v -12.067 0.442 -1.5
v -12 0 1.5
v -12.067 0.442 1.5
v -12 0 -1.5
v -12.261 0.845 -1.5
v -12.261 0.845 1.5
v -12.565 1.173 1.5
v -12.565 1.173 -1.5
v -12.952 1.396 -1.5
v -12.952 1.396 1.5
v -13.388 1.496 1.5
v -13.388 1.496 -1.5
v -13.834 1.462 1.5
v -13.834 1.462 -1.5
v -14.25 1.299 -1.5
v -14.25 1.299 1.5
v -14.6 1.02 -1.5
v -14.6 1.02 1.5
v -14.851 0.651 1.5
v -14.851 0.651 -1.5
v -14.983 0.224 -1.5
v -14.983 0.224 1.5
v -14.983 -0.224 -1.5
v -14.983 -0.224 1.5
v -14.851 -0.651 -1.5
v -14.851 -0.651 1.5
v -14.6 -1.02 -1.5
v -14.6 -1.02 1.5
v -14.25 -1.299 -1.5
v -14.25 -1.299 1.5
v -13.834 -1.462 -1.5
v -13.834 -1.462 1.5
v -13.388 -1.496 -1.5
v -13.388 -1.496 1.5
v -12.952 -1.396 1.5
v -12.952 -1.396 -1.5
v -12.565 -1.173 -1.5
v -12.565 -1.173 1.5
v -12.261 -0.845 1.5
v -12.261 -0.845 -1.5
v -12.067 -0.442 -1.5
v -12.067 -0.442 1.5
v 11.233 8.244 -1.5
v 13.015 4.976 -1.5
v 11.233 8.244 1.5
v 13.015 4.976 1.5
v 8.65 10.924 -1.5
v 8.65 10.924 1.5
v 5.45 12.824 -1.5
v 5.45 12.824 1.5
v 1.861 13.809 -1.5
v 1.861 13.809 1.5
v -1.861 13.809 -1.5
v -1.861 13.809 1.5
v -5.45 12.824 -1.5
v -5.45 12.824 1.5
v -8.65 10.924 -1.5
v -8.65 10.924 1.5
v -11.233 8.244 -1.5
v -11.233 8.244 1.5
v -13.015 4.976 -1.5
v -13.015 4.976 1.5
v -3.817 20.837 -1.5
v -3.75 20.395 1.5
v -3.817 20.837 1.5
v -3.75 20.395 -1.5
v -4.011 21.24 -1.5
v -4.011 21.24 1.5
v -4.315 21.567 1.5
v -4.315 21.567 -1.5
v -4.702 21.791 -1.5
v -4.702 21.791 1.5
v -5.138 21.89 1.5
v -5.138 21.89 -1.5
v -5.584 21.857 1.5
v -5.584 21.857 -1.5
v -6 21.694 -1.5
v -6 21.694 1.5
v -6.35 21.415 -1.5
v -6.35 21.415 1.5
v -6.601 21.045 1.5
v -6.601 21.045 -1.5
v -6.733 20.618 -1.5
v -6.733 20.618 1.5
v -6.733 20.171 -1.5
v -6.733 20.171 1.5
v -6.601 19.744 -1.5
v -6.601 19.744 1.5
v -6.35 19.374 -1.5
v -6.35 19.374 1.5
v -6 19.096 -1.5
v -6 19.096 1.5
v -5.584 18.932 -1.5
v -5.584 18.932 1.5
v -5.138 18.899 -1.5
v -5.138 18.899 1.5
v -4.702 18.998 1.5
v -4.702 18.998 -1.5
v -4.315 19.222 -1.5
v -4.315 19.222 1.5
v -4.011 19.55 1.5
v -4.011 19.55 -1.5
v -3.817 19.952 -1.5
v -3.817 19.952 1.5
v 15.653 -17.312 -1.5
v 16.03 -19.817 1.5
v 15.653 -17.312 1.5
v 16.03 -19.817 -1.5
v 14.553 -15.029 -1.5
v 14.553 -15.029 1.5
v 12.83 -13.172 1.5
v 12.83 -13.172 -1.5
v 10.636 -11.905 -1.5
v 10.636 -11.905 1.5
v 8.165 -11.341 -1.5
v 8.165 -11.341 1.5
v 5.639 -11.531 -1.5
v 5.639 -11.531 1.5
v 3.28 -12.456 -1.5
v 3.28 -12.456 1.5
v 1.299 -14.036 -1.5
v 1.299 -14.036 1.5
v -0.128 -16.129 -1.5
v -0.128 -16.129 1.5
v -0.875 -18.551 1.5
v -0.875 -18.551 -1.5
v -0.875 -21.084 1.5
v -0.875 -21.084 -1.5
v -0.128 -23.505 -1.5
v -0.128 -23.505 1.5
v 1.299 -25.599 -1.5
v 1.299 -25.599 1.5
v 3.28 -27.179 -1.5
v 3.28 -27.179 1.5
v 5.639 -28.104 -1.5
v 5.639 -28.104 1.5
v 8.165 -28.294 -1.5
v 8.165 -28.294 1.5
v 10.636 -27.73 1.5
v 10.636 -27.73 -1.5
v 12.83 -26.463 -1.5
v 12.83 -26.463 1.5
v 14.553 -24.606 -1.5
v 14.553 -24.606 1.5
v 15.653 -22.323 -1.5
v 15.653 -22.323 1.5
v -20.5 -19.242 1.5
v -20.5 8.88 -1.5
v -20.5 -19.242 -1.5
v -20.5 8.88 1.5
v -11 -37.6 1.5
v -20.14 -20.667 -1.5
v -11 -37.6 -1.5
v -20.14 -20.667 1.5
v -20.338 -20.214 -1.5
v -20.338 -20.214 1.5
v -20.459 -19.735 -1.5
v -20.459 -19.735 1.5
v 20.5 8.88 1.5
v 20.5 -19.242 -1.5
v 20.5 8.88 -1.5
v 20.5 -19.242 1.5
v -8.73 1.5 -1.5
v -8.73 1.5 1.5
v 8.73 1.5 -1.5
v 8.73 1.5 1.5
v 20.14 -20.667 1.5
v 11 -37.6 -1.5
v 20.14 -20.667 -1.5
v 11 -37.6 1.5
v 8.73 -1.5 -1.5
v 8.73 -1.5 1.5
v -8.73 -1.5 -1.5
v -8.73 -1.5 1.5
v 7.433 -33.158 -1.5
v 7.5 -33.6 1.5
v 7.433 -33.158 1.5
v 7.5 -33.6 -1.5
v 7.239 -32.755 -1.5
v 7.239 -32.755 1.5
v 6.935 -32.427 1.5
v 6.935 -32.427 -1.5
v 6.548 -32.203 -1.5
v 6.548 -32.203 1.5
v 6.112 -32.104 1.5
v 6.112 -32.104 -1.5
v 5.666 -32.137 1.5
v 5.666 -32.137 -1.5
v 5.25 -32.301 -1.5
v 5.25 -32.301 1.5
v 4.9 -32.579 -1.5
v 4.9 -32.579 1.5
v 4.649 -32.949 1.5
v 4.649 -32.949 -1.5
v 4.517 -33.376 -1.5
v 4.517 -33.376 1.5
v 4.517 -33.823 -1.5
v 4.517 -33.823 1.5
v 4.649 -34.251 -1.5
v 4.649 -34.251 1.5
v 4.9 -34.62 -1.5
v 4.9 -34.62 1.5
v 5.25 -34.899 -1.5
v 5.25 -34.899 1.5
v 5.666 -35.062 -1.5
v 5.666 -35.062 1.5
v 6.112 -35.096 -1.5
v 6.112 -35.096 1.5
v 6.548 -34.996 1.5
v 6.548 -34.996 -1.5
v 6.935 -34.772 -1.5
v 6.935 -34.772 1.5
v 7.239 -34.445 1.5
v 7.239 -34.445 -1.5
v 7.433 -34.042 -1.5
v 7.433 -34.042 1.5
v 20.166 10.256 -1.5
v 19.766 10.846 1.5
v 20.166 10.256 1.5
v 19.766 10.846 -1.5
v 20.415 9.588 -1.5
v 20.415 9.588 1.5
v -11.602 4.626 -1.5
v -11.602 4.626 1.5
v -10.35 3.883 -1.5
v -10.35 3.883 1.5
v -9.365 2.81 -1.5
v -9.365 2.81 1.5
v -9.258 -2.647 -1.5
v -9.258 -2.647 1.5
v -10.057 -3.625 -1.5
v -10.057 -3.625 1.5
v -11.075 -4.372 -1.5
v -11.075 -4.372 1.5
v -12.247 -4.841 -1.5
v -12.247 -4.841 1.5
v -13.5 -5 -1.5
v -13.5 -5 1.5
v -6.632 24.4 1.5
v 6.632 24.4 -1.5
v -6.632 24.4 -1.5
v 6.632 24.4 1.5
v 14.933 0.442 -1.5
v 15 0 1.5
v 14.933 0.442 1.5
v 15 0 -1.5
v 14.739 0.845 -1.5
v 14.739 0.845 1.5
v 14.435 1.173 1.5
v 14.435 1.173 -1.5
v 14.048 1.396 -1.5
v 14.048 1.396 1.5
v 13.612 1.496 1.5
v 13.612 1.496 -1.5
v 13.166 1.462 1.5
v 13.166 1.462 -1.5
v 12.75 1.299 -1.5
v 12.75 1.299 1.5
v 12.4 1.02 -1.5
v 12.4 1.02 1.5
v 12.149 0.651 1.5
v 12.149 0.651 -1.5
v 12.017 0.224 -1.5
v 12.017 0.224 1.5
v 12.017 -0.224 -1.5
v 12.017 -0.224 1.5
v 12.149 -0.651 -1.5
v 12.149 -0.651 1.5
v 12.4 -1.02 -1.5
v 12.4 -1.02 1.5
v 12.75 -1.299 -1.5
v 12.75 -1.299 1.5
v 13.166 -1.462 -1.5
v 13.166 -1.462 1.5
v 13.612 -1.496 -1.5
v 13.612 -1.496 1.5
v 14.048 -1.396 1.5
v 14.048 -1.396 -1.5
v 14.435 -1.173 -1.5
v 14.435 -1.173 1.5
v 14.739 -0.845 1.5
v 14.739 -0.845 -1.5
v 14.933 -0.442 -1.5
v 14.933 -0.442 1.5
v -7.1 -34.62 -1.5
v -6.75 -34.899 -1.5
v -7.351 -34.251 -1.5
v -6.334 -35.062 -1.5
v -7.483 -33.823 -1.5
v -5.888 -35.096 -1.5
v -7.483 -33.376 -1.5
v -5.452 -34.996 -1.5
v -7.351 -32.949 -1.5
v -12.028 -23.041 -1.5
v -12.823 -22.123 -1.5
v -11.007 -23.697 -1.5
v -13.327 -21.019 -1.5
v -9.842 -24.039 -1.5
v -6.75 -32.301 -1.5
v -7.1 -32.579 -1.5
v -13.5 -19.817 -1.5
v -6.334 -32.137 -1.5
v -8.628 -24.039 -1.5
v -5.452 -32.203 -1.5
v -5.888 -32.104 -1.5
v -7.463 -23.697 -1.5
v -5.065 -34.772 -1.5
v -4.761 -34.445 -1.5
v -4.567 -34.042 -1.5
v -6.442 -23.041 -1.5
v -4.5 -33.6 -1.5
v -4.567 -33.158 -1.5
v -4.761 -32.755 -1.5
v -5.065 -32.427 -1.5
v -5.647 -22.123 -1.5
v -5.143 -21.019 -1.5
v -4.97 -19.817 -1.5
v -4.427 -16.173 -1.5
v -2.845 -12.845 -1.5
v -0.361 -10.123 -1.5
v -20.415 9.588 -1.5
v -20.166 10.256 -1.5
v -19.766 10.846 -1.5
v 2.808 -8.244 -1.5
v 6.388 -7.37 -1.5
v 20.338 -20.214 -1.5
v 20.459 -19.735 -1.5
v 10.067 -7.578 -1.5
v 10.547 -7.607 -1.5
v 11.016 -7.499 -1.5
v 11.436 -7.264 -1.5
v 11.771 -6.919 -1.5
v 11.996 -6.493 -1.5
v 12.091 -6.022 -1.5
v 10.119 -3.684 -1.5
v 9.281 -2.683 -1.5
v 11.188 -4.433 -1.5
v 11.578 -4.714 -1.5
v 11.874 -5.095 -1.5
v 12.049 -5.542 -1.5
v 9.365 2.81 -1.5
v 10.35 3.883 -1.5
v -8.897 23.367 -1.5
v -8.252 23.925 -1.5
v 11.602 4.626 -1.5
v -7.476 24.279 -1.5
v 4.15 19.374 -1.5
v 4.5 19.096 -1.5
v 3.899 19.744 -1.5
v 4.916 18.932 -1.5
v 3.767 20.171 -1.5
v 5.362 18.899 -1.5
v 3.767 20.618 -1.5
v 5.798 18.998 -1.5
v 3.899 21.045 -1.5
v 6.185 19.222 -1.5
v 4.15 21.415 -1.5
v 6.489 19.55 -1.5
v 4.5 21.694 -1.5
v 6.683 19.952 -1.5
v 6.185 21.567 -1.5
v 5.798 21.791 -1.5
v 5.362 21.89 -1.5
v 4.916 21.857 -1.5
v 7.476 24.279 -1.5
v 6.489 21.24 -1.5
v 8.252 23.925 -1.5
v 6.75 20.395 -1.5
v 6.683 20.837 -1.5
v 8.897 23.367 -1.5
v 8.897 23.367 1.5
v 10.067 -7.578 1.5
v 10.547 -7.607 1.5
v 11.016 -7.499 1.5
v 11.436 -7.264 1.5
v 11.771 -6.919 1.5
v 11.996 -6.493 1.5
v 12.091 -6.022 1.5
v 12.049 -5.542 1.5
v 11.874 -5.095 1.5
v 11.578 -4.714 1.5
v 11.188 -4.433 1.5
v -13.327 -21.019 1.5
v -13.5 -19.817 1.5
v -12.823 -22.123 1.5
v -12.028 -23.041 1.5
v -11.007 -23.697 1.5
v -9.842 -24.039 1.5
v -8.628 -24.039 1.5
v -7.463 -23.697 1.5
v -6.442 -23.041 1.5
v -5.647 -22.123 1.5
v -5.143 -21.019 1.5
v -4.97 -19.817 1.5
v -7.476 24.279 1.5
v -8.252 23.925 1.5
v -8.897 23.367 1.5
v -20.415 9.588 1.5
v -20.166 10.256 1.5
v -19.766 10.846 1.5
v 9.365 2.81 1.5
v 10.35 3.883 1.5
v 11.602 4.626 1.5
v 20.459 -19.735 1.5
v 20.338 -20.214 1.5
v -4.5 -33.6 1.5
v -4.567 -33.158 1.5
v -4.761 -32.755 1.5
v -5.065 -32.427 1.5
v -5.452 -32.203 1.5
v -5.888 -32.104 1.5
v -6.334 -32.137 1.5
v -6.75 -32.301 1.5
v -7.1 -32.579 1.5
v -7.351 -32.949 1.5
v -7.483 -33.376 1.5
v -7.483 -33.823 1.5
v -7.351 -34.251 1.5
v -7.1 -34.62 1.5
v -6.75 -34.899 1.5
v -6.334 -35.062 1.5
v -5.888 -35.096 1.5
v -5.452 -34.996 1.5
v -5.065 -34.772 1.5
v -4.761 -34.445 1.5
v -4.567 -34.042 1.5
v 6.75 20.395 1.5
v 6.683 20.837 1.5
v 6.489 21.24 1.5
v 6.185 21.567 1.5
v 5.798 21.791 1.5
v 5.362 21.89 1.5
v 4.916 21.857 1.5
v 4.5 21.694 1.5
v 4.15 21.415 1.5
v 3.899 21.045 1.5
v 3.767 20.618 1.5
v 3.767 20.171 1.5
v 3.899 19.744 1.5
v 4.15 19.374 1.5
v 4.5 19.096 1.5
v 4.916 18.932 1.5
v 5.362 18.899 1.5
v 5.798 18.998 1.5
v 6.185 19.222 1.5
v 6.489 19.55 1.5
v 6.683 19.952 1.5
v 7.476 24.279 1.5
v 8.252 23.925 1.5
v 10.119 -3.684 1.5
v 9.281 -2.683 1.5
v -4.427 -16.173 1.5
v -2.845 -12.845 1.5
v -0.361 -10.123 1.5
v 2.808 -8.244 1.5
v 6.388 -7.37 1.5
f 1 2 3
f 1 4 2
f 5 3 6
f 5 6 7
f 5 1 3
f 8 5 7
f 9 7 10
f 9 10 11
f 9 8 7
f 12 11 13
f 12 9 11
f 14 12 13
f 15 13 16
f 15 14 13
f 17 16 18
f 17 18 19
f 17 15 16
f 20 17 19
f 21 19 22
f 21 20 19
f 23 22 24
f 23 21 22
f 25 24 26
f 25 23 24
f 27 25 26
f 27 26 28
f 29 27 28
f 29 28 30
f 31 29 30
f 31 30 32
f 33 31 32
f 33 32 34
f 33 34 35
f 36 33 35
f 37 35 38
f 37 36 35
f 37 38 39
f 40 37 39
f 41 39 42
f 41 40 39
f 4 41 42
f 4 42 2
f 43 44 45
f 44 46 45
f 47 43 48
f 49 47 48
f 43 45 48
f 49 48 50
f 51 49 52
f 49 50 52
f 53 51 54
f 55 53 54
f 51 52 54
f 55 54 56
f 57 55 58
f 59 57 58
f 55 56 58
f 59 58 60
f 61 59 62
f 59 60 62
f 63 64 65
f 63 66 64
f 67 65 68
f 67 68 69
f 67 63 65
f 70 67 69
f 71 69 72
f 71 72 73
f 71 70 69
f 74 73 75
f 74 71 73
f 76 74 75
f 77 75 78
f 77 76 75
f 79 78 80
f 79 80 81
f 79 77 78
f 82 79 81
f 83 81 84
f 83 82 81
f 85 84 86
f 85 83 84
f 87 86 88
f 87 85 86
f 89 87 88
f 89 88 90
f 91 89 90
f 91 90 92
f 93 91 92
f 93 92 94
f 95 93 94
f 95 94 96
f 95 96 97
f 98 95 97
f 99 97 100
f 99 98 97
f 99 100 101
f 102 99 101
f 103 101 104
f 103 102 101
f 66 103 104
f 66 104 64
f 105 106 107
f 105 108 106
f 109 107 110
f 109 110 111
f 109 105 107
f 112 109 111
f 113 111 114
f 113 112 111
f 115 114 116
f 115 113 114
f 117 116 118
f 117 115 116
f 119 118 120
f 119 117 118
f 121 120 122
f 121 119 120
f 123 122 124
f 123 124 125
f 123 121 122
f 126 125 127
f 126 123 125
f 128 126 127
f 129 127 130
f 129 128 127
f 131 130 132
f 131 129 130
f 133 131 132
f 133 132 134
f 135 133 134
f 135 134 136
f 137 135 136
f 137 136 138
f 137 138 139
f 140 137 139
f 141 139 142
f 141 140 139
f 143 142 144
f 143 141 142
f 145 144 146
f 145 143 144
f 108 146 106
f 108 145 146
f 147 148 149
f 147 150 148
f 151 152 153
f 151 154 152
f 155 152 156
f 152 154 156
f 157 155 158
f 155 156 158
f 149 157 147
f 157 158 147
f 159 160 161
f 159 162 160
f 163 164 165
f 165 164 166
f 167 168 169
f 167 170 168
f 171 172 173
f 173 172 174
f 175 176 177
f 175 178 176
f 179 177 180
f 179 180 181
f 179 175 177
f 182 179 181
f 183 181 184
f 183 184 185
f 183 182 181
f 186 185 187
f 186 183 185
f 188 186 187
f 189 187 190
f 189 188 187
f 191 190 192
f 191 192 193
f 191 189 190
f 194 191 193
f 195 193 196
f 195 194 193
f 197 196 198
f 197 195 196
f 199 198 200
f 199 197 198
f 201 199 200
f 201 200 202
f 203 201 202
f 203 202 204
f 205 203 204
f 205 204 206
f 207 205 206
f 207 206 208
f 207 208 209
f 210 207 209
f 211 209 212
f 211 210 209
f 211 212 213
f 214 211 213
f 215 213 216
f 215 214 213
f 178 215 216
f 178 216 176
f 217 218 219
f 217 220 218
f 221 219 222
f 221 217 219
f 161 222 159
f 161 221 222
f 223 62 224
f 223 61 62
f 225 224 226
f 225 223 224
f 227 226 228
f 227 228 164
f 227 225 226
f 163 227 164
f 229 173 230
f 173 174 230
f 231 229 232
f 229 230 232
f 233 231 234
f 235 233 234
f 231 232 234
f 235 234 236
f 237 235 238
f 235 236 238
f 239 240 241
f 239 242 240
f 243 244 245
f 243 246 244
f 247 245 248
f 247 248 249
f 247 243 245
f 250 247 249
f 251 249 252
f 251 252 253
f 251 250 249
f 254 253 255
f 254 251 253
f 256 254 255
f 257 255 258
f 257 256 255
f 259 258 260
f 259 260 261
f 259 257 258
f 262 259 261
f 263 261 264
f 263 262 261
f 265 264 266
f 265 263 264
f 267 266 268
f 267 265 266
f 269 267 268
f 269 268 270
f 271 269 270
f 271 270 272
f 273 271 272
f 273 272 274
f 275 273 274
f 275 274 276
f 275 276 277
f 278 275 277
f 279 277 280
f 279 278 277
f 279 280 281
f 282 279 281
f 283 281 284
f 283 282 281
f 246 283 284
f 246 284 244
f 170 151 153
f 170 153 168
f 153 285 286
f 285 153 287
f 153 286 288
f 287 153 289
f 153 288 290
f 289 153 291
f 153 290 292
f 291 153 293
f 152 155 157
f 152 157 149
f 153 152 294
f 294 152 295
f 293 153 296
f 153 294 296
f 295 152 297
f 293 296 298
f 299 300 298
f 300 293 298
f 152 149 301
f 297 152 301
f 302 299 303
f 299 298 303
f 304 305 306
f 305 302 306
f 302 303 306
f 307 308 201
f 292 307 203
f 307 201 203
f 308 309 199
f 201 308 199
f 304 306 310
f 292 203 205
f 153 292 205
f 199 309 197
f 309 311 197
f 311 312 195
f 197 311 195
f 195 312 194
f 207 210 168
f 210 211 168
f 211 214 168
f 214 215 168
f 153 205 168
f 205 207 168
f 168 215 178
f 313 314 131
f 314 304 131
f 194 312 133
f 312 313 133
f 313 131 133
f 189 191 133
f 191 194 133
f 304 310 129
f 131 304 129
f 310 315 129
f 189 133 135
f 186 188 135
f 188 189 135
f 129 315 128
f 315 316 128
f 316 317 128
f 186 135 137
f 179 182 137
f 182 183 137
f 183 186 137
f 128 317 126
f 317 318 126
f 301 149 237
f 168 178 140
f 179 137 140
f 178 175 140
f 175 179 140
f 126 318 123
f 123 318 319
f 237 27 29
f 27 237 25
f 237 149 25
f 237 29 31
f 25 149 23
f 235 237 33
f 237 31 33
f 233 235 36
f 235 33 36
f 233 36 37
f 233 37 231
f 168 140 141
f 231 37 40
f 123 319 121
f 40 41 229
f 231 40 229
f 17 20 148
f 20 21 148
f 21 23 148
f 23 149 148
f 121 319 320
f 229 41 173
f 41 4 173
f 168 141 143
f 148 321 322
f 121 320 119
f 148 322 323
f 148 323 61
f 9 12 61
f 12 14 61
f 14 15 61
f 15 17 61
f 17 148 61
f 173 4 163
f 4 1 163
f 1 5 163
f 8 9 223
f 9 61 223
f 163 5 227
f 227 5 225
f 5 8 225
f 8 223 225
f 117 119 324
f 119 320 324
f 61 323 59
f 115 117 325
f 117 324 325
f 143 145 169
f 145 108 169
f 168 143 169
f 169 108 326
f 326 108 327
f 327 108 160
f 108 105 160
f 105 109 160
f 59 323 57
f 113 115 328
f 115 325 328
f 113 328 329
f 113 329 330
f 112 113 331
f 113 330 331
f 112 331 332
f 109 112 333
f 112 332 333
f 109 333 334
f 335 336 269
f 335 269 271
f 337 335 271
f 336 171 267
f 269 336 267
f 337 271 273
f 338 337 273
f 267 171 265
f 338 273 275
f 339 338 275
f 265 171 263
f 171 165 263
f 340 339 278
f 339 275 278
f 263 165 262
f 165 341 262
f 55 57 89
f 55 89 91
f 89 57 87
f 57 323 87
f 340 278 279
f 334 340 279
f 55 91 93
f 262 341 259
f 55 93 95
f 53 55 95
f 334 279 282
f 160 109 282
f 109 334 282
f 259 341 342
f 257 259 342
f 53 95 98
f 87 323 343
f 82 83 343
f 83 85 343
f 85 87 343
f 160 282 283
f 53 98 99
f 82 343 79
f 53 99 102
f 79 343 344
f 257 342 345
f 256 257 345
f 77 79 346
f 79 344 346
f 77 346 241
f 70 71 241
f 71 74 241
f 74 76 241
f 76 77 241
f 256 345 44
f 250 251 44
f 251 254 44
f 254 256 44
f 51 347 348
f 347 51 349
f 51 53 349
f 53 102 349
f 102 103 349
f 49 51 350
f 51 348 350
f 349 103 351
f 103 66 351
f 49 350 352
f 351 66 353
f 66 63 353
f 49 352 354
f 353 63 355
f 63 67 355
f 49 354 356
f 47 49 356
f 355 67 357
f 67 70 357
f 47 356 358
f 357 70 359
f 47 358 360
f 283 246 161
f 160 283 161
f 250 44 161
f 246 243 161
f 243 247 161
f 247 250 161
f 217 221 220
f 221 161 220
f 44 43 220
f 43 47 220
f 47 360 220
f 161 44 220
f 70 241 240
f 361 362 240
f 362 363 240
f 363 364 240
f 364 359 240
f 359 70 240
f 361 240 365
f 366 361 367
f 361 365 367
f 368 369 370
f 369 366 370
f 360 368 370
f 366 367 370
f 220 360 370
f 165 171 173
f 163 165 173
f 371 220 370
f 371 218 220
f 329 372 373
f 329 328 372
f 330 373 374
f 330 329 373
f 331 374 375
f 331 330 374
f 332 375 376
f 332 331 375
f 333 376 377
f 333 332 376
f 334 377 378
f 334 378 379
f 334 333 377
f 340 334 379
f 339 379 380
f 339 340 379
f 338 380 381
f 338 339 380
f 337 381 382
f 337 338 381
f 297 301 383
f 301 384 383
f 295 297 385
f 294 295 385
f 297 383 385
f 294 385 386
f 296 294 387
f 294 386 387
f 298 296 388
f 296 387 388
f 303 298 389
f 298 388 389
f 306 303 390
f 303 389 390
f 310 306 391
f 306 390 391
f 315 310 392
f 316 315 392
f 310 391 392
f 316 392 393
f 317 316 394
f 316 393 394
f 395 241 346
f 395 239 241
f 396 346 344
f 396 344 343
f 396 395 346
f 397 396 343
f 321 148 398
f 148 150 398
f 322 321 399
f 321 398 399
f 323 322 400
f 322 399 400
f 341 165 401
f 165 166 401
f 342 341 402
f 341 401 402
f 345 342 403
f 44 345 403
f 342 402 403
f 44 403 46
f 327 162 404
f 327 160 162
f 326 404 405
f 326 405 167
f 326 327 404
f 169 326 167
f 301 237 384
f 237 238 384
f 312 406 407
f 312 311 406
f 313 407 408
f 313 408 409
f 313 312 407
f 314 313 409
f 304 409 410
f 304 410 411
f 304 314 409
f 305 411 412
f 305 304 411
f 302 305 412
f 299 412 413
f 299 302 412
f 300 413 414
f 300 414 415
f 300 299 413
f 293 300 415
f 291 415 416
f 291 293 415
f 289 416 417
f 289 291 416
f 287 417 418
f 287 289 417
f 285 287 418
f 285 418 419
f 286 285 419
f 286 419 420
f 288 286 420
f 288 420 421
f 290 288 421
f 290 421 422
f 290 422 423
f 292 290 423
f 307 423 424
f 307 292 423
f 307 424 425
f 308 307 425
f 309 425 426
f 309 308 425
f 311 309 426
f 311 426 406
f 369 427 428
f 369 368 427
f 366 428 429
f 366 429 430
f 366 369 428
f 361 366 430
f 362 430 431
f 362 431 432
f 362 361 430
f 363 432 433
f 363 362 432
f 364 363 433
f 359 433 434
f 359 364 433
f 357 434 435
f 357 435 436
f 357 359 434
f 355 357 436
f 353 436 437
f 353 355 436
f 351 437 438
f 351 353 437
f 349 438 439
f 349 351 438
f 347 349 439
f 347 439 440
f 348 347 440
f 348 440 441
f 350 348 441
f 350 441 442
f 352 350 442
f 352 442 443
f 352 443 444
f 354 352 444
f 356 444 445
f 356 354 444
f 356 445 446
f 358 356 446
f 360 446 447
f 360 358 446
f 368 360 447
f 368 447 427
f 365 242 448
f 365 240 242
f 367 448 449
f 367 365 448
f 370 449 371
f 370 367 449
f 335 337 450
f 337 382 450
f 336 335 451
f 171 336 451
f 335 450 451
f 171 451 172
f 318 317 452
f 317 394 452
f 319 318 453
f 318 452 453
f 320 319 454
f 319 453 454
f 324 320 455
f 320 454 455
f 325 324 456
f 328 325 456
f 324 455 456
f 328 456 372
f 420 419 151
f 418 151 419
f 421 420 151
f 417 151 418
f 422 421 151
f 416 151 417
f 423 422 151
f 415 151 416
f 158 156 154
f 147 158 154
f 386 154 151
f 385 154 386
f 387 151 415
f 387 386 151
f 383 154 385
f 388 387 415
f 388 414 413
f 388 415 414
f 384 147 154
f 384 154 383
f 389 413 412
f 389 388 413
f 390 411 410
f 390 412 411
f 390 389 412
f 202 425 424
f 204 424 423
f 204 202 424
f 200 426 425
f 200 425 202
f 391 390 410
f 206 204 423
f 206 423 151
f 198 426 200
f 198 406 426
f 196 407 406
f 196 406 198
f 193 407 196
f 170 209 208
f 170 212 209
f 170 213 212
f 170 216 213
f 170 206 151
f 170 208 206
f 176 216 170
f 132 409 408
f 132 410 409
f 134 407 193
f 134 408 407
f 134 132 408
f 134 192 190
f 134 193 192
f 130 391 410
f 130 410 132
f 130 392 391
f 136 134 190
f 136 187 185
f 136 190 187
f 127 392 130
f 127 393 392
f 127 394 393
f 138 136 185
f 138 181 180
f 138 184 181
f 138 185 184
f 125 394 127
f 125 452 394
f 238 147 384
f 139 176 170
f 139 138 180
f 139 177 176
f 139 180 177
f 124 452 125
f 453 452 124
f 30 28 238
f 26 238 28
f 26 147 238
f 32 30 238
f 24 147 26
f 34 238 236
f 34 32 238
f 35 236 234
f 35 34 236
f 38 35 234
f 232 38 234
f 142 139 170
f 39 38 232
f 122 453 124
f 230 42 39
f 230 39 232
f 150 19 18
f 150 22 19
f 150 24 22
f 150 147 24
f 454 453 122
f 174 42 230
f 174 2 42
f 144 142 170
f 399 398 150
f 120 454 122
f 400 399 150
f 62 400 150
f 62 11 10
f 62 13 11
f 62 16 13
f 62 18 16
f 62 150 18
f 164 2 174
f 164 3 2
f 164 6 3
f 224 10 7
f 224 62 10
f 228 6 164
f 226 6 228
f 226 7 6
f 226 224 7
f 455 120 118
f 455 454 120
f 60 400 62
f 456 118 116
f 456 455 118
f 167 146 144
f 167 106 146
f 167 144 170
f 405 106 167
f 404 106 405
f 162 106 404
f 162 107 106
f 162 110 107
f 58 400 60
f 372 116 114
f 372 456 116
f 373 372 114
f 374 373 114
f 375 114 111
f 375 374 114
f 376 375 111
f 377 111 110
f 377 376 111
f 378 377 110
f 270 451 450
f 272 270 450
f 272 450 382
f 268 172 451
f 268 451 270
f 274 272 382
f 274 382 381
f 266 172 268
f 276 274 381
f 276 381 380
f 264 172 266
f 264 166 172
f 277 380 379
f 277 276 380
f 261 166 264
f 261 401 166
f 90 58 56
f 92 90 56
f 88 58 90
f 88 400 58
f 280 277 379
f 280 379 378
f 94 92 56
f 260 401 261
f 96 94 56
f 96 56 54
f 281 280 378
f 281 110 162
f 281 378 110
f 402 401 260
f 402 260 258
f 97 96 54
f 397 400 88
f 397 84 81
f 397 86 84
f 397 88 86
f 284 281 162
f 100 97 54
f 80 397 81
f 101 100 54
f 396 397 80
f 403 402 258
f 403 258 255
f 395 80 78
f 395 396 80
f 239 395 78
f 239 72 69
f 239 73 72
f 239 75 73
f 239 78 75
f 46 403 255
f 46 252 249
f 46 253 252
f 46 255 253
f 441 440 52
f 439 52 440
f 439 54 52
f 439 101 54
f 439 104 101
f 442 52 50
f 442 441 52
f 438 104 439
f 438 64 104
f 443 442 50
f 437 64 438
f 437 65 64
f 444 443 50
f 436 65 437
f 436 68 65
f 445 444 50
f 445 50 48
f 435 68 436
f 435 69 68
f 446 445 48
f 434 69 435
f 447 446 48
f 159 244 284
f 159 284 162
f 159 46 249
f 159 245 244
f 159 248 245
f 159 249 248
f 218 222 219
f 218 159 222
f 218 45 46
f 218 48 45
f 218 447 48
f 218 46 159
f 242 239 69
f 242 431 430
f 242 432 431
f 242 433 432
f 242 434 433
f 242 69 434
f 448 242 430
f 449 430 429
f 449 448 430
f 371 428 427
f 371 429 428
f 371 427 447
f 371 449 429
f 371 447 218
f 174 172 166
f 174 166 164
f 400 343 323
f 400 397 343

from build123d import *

# Parameters (mm, degrees)
SKETCH1_R           = 1.5
SKETCH1_R_2         = 8.5
BOSS_EXTRUDE1_DEPTH = 1.5
FILLET1_R           = 3


with BuildPart() as part:
    # Sketch1 → Boss-Extrude1 (new body, symmetric)
    with BuildSketch(Plane.XY):
        Polygon((8, 24.400284093), (-8, 24.400284093), (-20.5, 10), (-20.5, -20), (-11, -37.599715907), (11, -37.599715907), (20.5, -20), (20.5, 10), align=None)
        with Locations((-5.25, 20.39454584)):
            Circle(SKETCH1_R, mode=Mode.SUBTRACT)
        with Locations((-13.5, 0)):
            Circle(SKETCH1_R, mode=Mode.SUBTRACT)
        with Locations((-6, -33.599715907)):
            Circle(SKETCH1_R, mode=Mode.SUBTRACT)
        with Locations((6, -33.599715907)):
            Circle(SKETCH1_R, mode=Mode.SUBTRACT)
        with Locations((13.5, 0)):
            Circle(SKETCH1_R, mode=Mode.SUBTRACT)
        with Locations((5.25, 20.39454584)):
            Circle(SKETCH1_R, mode=Mode.SUBTRACT)
        with Locations((7.530163354, -19.817414772)):
            Circle(SKETCH1_R_2, mode=Mode.SUBTRACT)
        with BuildLine():
            Line((-13.5, -5), (-13.5, -19.817414772))
            ThreePointArc((-13.5, -19.817414772), (-9.234918323, -24.082496449), (-4.969836646, -19.817414772))
            ThreePointArc((-4.969836646, -19.817414772), (-0.361028795, -10.12313365), (10.06681719, -7.57750516))
            ThreePointArc((10.06681719, -7.57750516), (11.99598649, -6.493442694), (11.187975781, -4.433344563))
            ThreePointArc((11.187975781, -4.433344563), (9.667400631, -3.211102938), (8.730303993, -1.5))
            Line((8.730303993, -1.5), (-8.730303993, -1.5))
            ThreePointArc((-8.730303993, -1.5), (-10.541960108, -4.031128874), (-13.5, -5))
        make_face(mode=Mode.SUBTRACT)
        with BuildLine():
            Line((-8.730303993, 1.5), (8.730303993, 1.5))
            ThreePointArc((8.730303993, 1.5), (10.349605217, 3.882655368), (13.014734561, 4.976396031))
            ThreePointArc((13.014734561, 4.976396031), (0, 13.933694167), (-13.014734561, 4.976396031))
            ThreePointArc((-13.014734561, 4.976396031), (-10.349605217, 3.882655368), (-8.730303993, 1.5))
        make_face(mode=Mode.SUBTRACT)
    extrude(amount=BOSS_EXTRUDE1_DEPTH, both=True)

    # Fillet1
    fillet1_edges = [part.edges().sort_by_distance(p)[0] for p in [
        (-20.5, -20, 0),
        (-20.5, 10, 0),
        (-8, 24.400284093, 0),
        (8, 24.400284093, 0),
        (20.5, 10, 0),
        (20.5, -20, 0),
    ]]
    fillet(fillet1_edges, radius=FILLET1_R)


solid = part.part
